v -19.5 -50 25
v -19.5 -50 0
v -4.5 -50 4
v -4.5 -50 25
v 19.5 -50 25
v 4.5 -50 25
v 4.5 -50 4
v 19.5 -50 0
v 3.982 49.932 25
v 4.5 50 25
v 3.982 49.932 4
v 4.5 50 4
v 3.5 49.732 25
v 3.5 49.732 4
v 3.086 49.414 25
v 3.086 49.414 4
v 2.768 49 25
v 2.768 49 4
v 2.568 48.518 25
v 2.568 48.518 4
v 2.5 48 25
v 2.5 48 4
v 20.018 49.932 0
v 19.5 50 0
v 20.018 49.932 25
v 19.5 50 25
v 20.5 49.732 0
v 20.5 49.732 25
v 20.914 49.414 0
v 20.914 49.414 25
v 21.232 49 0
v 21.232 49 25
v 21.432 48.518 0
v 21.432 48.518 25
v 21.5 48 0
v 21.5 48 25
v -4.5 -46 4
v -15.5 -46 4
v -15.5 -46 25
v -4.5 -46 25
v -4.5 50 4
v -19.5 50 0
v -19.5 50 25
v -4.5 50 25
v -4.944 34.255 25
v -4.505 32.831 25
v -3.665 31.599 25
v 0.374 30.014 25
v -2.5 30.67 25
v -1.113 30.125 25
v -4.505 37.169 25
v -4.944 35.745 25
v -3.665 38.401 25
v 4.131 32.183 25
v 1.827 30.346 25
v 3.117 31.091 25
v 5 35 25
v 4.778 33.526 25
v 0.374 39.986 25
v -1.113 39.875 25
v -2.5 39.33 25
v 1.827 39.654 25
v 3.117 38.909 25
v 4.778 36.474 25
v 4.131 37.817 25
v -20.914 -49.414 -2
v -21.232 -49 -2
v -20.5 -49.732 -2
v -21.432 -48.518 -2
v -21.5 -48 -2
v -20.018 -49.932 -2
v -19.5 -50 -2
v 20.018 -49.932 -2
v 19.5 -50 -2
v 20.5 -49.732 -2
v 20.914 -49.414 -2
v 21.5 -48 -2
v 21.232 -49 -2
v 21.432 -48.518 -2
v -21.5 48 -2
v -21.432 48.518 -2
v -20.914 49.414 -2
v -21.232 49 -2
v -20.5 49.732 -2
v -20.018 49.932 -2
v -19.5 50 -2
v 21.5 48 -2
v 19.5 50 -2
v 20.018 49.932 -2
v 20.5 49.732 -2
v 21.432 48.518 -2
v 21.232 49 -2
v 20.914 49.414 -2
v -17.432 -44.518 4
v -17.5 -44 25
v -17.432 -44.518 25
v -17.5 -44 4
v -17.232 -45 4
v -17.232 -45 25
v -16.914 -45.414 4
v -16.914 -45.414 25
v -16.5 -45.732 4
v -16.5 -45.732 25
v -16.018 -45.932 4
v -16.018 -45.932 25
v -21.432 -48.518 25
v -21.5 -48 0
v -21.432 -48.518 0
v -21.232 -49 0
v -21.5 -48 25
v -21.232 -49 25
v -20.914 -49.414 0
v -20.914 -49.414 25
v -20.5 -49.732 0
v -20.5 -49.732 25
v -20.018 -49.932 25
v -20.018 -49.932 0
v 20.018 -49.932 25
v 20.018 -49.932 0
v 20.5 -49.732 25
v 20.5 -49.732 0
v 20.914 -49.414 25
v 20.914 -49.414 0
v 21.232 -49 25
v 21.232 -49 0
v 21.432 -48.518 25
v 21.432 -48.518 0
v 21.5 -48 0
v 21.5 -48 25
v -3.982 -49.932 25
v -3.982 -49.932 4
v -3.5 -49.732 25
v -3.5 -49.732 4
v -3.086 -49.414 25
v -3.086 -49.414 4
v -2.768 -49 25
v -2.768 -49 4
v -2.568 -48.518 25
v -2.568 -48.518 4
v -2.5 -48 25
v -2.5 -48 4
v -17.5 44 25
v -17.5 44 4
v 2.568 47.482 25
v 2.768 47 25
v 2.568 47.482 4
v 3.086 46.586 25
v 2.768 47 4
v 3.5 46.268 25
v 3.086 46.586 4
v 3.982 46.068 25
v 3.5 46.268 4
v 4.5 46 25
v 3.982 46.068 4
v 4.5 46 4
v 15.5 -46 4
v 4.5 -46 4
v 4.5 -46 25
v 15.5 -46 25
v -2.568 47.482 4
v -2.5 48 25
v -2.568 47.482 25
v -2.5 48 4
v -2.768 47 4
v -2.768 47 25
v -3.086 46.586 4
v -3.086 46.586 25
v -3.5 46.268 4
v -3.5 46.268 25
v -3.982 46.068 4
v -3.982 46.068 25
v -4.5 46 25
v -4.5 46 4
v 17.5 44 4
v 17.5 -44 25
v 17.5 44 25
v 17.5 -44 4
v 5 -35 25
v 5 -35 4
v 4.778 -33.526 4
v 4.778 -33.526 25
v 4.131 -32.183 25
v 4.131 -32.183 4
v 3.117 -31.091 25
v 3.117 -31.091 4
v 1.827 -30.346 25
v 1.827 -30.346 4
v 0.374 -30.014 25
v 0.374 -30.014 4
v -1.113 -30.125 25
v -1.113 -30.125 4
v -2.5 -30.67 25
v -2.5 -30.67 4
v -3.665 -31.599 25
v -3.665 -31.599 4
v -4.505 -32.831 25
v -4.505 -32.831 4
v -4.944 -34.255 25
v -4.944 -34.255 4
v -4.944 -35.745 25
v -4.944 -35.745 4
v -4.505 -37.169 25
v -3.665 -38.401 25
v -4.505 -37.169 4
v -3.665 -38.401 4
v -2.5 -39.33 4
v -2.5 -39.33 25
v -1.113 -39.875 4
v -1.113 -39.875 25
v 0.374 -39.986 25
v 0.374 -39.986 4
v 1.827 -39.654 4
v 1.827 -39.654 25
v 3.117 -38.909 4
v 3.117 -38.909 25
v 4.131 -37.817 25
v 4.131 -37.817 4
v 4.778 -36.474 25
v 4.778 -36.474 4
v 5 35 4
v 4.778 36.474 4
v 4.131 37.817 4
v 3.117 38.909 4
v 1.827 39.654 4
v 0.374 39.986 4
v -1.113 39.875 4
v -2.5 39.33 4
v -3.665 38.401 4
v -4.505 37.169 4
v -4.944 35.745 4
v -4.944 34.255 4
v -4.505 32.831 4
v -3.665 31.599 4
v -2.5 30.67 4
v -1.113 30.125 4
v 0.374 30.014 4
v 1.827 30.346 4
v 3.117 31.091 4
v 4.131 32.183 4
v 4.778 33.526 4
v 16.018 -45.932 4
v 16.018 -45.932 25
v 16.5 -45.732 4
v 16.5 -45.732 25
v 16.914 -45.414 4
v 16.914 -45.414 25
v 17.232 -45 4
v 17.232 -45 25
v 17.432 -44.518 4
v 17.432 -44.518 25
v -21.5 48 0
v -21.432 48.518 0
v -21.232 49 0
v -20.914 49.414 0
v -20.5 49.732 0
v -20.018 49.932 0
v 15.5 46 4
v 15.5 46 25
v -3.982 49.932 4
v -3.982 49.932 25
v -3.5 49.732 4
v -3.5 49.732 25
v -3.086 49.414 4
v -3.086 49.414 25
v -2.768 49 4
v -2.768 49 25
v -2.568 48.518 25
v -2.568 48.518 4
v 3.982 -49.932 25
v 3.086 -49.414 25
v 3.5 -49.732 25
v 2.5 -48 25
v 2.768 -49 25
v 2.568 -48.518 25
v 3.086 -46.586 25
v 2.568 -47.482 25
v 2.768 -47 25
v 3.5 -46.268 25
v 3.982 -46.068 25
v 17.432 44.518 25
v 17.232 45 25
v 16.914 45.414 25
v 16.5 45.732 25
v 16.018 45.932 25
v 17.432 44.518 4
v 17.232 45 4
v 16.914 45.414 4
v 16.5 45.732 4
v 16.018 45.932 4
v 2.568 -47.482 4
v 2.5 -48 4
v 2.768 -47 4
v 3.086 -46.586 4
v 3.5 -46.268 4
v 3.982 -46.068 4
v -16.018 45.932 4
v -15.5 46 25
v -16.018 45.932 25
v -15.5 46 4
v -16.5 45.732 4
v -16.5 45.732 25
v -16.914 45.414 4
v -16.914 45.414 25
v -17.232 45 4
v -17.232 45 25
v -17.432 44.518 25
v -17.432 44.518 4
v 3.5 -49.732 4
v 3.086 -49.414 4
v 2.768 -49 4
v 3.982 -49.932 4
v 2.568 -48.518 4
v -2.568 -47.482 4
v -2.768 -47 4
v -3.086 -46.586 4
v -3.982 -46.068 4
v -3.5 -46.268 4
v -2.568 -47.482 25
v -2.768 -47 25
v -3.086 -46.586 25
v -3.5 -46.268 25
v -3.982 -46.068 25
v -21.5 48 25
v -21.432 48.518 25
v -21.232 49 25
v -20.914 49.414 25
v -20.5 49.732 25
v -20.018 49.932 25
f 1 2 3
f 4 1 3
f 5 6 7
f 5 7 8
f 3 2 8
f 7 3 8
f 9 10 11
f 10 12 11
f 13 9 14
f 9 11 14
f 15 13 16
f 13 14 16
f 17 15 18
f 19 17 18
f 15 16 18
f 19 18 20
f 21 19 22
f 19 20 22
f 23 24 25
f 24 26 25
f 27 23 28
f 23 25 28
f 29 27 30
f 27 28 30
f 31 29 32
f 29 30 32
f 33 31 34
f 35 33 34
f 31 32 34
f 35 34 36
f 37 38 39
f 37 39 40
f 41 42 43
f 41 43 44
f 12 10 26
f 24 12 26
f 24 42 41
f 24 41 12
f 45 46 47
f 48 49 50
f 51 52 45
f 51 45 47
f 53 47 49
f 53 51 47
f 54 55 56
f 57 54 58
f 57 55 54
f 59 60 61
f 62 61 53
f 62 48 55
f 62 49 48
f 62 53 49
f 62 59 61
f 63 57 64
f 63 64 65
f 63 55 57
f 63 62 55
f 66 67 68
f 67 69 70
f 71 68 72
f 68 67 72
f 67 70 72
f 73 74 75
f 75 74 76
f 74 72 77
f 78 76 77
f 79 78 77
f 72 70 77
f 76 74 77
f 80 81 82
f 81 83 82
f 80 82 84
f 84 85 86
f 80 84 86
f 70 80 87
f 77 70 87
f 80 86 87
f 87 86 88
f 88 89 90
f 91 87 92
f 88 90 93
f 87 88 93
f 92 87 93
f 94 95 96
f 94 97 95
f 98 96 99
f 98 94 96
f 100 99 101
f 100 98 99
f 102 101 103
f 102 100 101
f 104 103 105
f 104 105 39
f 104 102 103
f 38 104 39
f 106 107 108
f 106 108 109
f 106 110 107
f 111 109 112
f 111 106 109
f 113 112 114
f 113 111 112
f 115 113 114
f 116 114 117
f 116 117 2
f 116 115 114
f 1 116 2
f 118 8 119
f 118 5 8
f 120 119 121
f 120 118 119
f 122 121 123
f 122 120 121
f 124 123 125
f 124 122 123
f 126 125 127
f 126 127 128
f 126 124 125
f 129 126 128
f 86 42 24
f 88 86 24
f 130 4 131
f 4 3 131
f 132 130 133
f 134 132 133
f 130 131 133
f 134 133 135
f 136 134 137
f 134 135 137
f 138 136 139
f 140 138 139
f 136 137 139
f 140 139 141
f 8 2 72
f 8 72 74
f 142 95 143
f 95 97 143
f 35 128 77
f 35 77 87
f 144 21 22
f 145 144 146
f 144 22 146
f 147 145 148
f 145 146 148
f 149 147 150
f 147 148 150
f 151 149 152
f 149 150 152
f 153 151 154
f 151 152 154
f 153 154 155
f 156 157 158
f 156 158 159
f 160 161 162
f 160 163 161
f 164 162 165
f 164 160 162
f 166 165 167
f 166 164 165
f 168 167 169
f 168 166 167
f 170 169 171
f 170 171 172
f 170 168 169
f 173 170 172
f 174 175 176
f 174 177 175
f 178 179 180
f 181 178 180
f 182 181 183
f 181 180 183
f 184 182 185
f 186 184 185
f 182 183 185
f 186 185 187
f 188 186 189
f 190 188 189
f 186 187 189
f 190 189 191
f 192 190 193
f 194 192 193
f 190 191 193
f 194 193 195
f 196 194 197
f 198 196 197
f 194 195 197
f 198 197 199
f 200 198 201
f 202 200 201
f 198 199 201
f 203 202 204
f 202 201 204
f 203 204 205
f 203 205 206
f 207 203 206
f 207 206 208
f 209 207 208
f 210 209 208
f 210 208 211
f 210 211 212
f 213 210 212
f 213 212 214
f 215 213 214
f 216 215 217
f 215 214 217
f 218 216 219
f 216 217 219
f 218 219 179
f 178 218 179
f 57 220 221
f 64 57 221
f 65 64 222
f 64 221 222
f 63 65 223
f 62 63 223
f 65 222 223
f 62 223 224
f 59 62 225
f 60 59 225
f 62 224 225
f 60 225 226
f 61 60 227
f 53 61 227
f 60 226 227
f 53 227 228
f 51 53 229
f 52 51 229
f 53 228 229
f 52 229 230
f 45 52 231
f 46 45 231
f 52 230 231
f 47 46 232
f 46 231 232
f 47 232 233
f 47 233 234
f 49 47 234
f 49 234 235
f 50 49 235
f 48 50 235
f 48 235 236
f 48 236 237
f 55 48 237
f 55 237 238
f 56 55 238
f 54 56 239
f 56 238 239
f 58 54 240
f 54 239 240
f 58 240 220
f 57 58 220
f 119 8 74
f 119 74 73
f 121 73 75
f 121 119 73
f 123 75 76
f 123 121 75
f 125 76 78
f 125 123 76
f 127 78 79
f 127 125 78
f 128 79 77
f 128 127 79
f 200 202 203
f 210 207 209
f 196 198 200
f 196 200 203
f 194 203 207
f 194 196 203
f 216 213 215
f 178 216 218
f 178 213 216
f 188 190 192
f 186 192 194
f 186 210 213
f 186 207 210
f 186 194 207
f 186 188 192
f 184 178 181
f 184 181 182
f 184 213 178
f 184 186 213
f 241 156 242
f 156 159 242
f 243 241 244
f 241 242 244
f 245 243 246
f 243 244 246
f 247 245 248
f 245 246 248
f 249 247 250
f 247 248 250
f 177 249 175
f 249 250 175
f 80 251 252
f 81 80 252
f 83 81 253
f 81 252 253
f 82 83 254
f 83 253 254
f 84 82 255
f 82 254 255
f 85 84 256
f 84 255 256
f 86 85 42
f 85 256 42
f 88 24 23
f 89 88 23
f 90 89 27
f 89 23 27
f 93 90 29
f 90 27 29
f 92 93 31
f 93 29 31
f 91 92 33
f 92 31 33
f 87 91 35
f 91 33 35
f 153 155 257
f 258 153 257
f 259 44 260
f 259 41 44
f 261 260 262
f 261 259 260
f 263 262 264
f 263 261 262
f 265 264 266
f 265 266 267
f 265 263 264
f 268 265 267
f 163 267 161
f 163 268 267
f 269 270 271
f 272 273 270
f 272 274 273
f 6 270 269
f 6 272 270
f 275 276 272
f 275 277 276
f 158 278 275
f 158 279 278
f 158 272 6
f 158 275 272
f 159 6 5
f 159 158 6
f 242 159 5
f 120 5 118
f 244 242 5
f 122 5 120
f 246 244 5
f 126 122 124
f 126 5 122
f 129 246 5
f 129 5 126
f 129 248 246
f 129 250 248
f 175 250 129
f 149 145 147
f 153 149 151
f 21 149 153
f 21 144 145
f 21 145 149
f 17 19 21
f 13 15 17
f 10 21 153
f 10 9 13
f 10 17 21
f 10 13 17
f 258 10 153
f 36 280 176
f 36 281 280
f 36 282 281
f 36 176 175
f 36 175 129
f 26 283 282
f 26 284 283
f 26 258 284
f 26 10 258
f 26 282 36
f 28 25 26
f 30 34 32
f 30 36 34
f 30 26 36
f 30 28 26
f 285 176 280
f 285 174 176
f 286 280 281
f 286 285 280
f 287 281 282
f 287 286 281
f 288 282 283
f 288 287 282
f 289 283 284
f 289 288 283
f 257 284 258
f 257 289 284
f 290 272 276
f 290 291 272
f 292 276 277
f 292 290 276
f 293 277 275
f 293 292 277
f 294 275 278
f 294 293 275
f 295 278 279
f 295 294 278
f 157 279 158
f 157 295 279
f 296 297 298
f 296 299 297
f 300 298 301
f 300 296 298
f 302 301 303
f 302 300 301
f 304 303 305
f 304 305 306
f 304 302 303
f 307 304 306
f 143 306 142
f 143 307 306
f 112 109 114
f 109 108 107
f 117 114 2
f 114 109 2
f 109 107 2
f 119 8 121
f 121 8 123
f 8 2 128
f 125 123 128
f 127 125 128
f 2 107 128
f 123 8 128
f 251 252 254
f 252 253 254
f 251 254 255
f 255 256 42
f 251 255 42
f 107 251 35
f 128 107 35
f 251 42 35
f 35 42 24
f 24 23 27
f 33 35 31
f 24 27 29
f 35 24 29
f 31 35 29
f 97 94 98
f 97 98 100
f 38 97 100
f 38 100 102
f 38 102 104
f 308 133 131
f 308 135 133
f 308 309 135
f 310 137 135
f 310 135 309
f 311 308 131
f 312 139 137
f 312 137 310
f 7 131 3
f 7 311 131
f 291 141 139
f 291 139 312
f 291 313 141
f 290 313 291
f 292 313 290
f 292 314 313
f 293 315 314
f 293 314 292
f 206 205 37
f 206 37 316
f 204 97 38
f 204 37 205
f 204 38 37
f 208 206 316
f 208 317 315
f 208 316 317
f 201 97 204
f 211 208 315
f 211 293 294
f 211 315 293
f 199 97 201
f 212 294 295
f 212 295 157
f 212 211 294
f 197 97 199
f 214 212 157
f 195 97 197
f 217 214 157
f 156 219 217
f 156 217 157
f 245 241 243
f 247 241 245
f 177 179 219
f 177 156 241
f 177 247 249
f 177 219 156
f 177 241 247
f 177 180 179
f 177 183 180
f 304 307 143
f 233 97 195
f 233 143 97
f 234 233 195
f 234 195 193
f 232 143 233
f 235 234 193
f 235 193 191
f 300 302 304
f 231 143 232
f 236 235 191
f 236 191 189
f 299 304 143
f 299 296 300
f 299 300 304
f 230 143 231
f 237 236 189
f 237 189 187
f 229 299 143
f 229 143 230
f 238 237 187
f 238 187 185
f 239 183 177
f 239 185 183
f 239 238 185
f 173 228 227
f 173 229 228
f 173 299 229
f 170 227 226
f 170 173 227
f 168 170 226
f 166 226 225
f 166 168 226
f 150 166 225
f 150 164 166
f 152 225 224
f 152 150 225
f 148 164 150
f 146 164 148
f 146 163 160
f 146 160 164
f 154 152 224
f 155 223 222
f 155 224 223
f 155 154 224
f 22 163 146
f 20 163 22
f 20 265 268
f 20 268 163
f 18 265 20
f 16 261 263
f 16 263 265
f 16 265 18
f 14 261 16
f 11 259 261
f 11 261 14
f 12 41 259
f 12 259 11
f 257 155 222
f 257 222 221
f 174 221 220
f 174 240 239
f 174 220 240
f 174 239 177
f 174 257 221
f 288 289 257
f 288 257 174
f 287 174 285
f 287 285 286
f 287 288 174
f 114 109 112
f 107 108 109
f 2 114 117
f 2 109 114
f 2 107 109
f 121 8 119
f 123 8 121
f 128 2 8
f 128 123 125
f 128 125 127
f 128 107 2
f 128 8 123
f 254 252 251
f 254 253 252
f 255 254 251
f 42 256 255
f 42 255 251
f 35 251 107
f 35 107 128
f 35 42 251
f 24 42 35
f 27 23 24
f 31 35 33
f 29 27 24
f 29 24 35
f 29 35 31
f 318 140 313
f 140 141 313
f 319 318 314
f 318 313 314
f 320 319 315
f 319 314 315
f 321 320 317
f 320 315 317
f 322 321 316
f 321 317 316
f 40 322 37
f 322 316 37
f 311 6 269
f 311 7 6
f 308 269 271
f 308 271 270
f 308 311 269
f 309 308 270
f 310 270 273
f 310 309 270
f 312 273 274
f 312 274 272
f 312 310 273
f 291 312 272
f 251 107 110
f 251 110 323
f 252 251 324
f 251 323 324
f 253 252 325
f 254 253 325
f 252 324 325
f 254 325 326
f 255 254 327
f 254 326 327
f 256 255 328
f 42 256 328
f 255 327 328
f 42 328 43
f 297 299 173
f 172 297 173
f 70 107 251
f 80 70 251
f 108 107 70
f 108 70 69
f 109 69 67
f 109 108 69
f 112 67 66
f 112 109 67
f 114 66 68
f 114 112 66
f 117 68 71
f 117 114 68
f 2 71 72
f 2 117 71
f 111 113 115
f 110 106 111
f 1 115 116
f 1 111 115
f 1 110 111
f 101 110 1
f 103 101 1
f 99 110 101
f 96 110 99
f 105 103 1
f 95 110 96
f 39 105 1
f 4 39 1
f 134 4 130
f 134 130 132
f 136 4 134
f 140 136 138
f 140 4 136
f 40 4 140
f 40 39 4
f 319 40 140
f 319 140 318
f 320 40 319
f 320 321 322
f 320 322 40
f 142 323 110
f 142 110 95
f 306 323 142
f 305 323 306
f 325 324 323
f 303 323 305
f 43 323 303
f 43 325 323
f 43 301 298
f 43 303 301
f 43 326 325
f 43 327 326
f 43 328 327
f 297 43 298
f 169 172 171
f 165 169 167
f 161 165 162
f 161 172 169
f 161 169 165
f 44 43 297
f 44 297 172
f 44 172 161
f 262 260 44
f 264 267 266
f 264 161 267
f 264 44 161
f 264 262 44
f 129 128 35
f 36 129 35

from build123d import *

# Parameters (mm, degrees)
F0_W     = 43
F0_H     = 100
F1_DEPTH = 25
F2_T     = -4
F3_R     = 5
F4_DEPTH = 21
F5_W     = 5
F5_H     = 10
F5_H_2   = 8
F6_DEPTH = 21
F7_R     = 1.99999
F8_DEPTH = 2


# Not quite as in the source:
# - a fillet or chamfer is up to 0.001 mm smaller than in the source, because OpenCascade refuses the exact size


with BuildPart() as f1:
    # F0 (on Top) → F1 (new body)
    with BuildSketch(Plane.XY):
        Rectangle(F0_W, F0_H)
    extrude(amount=F1_DEPTH)

    # F2
    f2_openings = [f1.faces().sort_by_distance(p)[0] for p in [
        (0, 0, 25),
    ]]
    offset(amount=F2_T, openings=f2_openings)

    # F3 (on face) → F4 (join, through all)
    with BuildSketch(Plane.XY.offset(4)):
        with Locations((0, 35)):
            Circle(F3_R)
        with Locations((0, -35)):
            Circle(F3_R)
    extrude(amount=F4_DEPTH)

    # F5 (on face) → F6 (cut, through all)
    with BuildSketch(Plane.XY.offset(25)):
        with Locations((0, 46)):
            Rectangle(F5_W, F5_H)
        with Locations((0, -46)):
            Rectangle(F5_W, F5_H_2)
    extrude(amount=-F6_DEPTH, mode=Mode.SUBTRACT)

    # F7 (radius 2 in the source; OpenCascade refuses exactly that, so slightly less here)
    f7_edges = [f1.edges().sort_by_distance(p)[0] for p in [
        (-2.5, -46, 14.5),
        (-2.5, -50, 14.5),
        (2.5, -50, 14.5),
        (-2.5, 50, 14.5),
        (-2.5, 46, 14.5),
        (2.5, 46, 14.5),
        (2.5, -46, 14.5),
        (2.5, 50, 14.5),
        (17.5, 46, 14.5),
        (17.5, -46, 14.5),
        (-17.5, -46, 14.5),
        (-17.5, 46, 14.5),
        (-21.5, -50, 12.5),
        (21.5, -50, 12.5),
        (21.5, 50, 12.5),
        (-21.5, 50, 12.5),
    ]]
    fillet(f7_edges, radius=F7_R)


with BuildPart() as f8:
    # F8 (new): a face of the model
    f8_faces = [f1.part.faces().sort_by_distance(p)[0] for p in [
        (0, 0, 0),
    ]]
    extrude(f8_faces, amount=F8_DEPTH)


solid = Compound([f1.part, f8.part])
